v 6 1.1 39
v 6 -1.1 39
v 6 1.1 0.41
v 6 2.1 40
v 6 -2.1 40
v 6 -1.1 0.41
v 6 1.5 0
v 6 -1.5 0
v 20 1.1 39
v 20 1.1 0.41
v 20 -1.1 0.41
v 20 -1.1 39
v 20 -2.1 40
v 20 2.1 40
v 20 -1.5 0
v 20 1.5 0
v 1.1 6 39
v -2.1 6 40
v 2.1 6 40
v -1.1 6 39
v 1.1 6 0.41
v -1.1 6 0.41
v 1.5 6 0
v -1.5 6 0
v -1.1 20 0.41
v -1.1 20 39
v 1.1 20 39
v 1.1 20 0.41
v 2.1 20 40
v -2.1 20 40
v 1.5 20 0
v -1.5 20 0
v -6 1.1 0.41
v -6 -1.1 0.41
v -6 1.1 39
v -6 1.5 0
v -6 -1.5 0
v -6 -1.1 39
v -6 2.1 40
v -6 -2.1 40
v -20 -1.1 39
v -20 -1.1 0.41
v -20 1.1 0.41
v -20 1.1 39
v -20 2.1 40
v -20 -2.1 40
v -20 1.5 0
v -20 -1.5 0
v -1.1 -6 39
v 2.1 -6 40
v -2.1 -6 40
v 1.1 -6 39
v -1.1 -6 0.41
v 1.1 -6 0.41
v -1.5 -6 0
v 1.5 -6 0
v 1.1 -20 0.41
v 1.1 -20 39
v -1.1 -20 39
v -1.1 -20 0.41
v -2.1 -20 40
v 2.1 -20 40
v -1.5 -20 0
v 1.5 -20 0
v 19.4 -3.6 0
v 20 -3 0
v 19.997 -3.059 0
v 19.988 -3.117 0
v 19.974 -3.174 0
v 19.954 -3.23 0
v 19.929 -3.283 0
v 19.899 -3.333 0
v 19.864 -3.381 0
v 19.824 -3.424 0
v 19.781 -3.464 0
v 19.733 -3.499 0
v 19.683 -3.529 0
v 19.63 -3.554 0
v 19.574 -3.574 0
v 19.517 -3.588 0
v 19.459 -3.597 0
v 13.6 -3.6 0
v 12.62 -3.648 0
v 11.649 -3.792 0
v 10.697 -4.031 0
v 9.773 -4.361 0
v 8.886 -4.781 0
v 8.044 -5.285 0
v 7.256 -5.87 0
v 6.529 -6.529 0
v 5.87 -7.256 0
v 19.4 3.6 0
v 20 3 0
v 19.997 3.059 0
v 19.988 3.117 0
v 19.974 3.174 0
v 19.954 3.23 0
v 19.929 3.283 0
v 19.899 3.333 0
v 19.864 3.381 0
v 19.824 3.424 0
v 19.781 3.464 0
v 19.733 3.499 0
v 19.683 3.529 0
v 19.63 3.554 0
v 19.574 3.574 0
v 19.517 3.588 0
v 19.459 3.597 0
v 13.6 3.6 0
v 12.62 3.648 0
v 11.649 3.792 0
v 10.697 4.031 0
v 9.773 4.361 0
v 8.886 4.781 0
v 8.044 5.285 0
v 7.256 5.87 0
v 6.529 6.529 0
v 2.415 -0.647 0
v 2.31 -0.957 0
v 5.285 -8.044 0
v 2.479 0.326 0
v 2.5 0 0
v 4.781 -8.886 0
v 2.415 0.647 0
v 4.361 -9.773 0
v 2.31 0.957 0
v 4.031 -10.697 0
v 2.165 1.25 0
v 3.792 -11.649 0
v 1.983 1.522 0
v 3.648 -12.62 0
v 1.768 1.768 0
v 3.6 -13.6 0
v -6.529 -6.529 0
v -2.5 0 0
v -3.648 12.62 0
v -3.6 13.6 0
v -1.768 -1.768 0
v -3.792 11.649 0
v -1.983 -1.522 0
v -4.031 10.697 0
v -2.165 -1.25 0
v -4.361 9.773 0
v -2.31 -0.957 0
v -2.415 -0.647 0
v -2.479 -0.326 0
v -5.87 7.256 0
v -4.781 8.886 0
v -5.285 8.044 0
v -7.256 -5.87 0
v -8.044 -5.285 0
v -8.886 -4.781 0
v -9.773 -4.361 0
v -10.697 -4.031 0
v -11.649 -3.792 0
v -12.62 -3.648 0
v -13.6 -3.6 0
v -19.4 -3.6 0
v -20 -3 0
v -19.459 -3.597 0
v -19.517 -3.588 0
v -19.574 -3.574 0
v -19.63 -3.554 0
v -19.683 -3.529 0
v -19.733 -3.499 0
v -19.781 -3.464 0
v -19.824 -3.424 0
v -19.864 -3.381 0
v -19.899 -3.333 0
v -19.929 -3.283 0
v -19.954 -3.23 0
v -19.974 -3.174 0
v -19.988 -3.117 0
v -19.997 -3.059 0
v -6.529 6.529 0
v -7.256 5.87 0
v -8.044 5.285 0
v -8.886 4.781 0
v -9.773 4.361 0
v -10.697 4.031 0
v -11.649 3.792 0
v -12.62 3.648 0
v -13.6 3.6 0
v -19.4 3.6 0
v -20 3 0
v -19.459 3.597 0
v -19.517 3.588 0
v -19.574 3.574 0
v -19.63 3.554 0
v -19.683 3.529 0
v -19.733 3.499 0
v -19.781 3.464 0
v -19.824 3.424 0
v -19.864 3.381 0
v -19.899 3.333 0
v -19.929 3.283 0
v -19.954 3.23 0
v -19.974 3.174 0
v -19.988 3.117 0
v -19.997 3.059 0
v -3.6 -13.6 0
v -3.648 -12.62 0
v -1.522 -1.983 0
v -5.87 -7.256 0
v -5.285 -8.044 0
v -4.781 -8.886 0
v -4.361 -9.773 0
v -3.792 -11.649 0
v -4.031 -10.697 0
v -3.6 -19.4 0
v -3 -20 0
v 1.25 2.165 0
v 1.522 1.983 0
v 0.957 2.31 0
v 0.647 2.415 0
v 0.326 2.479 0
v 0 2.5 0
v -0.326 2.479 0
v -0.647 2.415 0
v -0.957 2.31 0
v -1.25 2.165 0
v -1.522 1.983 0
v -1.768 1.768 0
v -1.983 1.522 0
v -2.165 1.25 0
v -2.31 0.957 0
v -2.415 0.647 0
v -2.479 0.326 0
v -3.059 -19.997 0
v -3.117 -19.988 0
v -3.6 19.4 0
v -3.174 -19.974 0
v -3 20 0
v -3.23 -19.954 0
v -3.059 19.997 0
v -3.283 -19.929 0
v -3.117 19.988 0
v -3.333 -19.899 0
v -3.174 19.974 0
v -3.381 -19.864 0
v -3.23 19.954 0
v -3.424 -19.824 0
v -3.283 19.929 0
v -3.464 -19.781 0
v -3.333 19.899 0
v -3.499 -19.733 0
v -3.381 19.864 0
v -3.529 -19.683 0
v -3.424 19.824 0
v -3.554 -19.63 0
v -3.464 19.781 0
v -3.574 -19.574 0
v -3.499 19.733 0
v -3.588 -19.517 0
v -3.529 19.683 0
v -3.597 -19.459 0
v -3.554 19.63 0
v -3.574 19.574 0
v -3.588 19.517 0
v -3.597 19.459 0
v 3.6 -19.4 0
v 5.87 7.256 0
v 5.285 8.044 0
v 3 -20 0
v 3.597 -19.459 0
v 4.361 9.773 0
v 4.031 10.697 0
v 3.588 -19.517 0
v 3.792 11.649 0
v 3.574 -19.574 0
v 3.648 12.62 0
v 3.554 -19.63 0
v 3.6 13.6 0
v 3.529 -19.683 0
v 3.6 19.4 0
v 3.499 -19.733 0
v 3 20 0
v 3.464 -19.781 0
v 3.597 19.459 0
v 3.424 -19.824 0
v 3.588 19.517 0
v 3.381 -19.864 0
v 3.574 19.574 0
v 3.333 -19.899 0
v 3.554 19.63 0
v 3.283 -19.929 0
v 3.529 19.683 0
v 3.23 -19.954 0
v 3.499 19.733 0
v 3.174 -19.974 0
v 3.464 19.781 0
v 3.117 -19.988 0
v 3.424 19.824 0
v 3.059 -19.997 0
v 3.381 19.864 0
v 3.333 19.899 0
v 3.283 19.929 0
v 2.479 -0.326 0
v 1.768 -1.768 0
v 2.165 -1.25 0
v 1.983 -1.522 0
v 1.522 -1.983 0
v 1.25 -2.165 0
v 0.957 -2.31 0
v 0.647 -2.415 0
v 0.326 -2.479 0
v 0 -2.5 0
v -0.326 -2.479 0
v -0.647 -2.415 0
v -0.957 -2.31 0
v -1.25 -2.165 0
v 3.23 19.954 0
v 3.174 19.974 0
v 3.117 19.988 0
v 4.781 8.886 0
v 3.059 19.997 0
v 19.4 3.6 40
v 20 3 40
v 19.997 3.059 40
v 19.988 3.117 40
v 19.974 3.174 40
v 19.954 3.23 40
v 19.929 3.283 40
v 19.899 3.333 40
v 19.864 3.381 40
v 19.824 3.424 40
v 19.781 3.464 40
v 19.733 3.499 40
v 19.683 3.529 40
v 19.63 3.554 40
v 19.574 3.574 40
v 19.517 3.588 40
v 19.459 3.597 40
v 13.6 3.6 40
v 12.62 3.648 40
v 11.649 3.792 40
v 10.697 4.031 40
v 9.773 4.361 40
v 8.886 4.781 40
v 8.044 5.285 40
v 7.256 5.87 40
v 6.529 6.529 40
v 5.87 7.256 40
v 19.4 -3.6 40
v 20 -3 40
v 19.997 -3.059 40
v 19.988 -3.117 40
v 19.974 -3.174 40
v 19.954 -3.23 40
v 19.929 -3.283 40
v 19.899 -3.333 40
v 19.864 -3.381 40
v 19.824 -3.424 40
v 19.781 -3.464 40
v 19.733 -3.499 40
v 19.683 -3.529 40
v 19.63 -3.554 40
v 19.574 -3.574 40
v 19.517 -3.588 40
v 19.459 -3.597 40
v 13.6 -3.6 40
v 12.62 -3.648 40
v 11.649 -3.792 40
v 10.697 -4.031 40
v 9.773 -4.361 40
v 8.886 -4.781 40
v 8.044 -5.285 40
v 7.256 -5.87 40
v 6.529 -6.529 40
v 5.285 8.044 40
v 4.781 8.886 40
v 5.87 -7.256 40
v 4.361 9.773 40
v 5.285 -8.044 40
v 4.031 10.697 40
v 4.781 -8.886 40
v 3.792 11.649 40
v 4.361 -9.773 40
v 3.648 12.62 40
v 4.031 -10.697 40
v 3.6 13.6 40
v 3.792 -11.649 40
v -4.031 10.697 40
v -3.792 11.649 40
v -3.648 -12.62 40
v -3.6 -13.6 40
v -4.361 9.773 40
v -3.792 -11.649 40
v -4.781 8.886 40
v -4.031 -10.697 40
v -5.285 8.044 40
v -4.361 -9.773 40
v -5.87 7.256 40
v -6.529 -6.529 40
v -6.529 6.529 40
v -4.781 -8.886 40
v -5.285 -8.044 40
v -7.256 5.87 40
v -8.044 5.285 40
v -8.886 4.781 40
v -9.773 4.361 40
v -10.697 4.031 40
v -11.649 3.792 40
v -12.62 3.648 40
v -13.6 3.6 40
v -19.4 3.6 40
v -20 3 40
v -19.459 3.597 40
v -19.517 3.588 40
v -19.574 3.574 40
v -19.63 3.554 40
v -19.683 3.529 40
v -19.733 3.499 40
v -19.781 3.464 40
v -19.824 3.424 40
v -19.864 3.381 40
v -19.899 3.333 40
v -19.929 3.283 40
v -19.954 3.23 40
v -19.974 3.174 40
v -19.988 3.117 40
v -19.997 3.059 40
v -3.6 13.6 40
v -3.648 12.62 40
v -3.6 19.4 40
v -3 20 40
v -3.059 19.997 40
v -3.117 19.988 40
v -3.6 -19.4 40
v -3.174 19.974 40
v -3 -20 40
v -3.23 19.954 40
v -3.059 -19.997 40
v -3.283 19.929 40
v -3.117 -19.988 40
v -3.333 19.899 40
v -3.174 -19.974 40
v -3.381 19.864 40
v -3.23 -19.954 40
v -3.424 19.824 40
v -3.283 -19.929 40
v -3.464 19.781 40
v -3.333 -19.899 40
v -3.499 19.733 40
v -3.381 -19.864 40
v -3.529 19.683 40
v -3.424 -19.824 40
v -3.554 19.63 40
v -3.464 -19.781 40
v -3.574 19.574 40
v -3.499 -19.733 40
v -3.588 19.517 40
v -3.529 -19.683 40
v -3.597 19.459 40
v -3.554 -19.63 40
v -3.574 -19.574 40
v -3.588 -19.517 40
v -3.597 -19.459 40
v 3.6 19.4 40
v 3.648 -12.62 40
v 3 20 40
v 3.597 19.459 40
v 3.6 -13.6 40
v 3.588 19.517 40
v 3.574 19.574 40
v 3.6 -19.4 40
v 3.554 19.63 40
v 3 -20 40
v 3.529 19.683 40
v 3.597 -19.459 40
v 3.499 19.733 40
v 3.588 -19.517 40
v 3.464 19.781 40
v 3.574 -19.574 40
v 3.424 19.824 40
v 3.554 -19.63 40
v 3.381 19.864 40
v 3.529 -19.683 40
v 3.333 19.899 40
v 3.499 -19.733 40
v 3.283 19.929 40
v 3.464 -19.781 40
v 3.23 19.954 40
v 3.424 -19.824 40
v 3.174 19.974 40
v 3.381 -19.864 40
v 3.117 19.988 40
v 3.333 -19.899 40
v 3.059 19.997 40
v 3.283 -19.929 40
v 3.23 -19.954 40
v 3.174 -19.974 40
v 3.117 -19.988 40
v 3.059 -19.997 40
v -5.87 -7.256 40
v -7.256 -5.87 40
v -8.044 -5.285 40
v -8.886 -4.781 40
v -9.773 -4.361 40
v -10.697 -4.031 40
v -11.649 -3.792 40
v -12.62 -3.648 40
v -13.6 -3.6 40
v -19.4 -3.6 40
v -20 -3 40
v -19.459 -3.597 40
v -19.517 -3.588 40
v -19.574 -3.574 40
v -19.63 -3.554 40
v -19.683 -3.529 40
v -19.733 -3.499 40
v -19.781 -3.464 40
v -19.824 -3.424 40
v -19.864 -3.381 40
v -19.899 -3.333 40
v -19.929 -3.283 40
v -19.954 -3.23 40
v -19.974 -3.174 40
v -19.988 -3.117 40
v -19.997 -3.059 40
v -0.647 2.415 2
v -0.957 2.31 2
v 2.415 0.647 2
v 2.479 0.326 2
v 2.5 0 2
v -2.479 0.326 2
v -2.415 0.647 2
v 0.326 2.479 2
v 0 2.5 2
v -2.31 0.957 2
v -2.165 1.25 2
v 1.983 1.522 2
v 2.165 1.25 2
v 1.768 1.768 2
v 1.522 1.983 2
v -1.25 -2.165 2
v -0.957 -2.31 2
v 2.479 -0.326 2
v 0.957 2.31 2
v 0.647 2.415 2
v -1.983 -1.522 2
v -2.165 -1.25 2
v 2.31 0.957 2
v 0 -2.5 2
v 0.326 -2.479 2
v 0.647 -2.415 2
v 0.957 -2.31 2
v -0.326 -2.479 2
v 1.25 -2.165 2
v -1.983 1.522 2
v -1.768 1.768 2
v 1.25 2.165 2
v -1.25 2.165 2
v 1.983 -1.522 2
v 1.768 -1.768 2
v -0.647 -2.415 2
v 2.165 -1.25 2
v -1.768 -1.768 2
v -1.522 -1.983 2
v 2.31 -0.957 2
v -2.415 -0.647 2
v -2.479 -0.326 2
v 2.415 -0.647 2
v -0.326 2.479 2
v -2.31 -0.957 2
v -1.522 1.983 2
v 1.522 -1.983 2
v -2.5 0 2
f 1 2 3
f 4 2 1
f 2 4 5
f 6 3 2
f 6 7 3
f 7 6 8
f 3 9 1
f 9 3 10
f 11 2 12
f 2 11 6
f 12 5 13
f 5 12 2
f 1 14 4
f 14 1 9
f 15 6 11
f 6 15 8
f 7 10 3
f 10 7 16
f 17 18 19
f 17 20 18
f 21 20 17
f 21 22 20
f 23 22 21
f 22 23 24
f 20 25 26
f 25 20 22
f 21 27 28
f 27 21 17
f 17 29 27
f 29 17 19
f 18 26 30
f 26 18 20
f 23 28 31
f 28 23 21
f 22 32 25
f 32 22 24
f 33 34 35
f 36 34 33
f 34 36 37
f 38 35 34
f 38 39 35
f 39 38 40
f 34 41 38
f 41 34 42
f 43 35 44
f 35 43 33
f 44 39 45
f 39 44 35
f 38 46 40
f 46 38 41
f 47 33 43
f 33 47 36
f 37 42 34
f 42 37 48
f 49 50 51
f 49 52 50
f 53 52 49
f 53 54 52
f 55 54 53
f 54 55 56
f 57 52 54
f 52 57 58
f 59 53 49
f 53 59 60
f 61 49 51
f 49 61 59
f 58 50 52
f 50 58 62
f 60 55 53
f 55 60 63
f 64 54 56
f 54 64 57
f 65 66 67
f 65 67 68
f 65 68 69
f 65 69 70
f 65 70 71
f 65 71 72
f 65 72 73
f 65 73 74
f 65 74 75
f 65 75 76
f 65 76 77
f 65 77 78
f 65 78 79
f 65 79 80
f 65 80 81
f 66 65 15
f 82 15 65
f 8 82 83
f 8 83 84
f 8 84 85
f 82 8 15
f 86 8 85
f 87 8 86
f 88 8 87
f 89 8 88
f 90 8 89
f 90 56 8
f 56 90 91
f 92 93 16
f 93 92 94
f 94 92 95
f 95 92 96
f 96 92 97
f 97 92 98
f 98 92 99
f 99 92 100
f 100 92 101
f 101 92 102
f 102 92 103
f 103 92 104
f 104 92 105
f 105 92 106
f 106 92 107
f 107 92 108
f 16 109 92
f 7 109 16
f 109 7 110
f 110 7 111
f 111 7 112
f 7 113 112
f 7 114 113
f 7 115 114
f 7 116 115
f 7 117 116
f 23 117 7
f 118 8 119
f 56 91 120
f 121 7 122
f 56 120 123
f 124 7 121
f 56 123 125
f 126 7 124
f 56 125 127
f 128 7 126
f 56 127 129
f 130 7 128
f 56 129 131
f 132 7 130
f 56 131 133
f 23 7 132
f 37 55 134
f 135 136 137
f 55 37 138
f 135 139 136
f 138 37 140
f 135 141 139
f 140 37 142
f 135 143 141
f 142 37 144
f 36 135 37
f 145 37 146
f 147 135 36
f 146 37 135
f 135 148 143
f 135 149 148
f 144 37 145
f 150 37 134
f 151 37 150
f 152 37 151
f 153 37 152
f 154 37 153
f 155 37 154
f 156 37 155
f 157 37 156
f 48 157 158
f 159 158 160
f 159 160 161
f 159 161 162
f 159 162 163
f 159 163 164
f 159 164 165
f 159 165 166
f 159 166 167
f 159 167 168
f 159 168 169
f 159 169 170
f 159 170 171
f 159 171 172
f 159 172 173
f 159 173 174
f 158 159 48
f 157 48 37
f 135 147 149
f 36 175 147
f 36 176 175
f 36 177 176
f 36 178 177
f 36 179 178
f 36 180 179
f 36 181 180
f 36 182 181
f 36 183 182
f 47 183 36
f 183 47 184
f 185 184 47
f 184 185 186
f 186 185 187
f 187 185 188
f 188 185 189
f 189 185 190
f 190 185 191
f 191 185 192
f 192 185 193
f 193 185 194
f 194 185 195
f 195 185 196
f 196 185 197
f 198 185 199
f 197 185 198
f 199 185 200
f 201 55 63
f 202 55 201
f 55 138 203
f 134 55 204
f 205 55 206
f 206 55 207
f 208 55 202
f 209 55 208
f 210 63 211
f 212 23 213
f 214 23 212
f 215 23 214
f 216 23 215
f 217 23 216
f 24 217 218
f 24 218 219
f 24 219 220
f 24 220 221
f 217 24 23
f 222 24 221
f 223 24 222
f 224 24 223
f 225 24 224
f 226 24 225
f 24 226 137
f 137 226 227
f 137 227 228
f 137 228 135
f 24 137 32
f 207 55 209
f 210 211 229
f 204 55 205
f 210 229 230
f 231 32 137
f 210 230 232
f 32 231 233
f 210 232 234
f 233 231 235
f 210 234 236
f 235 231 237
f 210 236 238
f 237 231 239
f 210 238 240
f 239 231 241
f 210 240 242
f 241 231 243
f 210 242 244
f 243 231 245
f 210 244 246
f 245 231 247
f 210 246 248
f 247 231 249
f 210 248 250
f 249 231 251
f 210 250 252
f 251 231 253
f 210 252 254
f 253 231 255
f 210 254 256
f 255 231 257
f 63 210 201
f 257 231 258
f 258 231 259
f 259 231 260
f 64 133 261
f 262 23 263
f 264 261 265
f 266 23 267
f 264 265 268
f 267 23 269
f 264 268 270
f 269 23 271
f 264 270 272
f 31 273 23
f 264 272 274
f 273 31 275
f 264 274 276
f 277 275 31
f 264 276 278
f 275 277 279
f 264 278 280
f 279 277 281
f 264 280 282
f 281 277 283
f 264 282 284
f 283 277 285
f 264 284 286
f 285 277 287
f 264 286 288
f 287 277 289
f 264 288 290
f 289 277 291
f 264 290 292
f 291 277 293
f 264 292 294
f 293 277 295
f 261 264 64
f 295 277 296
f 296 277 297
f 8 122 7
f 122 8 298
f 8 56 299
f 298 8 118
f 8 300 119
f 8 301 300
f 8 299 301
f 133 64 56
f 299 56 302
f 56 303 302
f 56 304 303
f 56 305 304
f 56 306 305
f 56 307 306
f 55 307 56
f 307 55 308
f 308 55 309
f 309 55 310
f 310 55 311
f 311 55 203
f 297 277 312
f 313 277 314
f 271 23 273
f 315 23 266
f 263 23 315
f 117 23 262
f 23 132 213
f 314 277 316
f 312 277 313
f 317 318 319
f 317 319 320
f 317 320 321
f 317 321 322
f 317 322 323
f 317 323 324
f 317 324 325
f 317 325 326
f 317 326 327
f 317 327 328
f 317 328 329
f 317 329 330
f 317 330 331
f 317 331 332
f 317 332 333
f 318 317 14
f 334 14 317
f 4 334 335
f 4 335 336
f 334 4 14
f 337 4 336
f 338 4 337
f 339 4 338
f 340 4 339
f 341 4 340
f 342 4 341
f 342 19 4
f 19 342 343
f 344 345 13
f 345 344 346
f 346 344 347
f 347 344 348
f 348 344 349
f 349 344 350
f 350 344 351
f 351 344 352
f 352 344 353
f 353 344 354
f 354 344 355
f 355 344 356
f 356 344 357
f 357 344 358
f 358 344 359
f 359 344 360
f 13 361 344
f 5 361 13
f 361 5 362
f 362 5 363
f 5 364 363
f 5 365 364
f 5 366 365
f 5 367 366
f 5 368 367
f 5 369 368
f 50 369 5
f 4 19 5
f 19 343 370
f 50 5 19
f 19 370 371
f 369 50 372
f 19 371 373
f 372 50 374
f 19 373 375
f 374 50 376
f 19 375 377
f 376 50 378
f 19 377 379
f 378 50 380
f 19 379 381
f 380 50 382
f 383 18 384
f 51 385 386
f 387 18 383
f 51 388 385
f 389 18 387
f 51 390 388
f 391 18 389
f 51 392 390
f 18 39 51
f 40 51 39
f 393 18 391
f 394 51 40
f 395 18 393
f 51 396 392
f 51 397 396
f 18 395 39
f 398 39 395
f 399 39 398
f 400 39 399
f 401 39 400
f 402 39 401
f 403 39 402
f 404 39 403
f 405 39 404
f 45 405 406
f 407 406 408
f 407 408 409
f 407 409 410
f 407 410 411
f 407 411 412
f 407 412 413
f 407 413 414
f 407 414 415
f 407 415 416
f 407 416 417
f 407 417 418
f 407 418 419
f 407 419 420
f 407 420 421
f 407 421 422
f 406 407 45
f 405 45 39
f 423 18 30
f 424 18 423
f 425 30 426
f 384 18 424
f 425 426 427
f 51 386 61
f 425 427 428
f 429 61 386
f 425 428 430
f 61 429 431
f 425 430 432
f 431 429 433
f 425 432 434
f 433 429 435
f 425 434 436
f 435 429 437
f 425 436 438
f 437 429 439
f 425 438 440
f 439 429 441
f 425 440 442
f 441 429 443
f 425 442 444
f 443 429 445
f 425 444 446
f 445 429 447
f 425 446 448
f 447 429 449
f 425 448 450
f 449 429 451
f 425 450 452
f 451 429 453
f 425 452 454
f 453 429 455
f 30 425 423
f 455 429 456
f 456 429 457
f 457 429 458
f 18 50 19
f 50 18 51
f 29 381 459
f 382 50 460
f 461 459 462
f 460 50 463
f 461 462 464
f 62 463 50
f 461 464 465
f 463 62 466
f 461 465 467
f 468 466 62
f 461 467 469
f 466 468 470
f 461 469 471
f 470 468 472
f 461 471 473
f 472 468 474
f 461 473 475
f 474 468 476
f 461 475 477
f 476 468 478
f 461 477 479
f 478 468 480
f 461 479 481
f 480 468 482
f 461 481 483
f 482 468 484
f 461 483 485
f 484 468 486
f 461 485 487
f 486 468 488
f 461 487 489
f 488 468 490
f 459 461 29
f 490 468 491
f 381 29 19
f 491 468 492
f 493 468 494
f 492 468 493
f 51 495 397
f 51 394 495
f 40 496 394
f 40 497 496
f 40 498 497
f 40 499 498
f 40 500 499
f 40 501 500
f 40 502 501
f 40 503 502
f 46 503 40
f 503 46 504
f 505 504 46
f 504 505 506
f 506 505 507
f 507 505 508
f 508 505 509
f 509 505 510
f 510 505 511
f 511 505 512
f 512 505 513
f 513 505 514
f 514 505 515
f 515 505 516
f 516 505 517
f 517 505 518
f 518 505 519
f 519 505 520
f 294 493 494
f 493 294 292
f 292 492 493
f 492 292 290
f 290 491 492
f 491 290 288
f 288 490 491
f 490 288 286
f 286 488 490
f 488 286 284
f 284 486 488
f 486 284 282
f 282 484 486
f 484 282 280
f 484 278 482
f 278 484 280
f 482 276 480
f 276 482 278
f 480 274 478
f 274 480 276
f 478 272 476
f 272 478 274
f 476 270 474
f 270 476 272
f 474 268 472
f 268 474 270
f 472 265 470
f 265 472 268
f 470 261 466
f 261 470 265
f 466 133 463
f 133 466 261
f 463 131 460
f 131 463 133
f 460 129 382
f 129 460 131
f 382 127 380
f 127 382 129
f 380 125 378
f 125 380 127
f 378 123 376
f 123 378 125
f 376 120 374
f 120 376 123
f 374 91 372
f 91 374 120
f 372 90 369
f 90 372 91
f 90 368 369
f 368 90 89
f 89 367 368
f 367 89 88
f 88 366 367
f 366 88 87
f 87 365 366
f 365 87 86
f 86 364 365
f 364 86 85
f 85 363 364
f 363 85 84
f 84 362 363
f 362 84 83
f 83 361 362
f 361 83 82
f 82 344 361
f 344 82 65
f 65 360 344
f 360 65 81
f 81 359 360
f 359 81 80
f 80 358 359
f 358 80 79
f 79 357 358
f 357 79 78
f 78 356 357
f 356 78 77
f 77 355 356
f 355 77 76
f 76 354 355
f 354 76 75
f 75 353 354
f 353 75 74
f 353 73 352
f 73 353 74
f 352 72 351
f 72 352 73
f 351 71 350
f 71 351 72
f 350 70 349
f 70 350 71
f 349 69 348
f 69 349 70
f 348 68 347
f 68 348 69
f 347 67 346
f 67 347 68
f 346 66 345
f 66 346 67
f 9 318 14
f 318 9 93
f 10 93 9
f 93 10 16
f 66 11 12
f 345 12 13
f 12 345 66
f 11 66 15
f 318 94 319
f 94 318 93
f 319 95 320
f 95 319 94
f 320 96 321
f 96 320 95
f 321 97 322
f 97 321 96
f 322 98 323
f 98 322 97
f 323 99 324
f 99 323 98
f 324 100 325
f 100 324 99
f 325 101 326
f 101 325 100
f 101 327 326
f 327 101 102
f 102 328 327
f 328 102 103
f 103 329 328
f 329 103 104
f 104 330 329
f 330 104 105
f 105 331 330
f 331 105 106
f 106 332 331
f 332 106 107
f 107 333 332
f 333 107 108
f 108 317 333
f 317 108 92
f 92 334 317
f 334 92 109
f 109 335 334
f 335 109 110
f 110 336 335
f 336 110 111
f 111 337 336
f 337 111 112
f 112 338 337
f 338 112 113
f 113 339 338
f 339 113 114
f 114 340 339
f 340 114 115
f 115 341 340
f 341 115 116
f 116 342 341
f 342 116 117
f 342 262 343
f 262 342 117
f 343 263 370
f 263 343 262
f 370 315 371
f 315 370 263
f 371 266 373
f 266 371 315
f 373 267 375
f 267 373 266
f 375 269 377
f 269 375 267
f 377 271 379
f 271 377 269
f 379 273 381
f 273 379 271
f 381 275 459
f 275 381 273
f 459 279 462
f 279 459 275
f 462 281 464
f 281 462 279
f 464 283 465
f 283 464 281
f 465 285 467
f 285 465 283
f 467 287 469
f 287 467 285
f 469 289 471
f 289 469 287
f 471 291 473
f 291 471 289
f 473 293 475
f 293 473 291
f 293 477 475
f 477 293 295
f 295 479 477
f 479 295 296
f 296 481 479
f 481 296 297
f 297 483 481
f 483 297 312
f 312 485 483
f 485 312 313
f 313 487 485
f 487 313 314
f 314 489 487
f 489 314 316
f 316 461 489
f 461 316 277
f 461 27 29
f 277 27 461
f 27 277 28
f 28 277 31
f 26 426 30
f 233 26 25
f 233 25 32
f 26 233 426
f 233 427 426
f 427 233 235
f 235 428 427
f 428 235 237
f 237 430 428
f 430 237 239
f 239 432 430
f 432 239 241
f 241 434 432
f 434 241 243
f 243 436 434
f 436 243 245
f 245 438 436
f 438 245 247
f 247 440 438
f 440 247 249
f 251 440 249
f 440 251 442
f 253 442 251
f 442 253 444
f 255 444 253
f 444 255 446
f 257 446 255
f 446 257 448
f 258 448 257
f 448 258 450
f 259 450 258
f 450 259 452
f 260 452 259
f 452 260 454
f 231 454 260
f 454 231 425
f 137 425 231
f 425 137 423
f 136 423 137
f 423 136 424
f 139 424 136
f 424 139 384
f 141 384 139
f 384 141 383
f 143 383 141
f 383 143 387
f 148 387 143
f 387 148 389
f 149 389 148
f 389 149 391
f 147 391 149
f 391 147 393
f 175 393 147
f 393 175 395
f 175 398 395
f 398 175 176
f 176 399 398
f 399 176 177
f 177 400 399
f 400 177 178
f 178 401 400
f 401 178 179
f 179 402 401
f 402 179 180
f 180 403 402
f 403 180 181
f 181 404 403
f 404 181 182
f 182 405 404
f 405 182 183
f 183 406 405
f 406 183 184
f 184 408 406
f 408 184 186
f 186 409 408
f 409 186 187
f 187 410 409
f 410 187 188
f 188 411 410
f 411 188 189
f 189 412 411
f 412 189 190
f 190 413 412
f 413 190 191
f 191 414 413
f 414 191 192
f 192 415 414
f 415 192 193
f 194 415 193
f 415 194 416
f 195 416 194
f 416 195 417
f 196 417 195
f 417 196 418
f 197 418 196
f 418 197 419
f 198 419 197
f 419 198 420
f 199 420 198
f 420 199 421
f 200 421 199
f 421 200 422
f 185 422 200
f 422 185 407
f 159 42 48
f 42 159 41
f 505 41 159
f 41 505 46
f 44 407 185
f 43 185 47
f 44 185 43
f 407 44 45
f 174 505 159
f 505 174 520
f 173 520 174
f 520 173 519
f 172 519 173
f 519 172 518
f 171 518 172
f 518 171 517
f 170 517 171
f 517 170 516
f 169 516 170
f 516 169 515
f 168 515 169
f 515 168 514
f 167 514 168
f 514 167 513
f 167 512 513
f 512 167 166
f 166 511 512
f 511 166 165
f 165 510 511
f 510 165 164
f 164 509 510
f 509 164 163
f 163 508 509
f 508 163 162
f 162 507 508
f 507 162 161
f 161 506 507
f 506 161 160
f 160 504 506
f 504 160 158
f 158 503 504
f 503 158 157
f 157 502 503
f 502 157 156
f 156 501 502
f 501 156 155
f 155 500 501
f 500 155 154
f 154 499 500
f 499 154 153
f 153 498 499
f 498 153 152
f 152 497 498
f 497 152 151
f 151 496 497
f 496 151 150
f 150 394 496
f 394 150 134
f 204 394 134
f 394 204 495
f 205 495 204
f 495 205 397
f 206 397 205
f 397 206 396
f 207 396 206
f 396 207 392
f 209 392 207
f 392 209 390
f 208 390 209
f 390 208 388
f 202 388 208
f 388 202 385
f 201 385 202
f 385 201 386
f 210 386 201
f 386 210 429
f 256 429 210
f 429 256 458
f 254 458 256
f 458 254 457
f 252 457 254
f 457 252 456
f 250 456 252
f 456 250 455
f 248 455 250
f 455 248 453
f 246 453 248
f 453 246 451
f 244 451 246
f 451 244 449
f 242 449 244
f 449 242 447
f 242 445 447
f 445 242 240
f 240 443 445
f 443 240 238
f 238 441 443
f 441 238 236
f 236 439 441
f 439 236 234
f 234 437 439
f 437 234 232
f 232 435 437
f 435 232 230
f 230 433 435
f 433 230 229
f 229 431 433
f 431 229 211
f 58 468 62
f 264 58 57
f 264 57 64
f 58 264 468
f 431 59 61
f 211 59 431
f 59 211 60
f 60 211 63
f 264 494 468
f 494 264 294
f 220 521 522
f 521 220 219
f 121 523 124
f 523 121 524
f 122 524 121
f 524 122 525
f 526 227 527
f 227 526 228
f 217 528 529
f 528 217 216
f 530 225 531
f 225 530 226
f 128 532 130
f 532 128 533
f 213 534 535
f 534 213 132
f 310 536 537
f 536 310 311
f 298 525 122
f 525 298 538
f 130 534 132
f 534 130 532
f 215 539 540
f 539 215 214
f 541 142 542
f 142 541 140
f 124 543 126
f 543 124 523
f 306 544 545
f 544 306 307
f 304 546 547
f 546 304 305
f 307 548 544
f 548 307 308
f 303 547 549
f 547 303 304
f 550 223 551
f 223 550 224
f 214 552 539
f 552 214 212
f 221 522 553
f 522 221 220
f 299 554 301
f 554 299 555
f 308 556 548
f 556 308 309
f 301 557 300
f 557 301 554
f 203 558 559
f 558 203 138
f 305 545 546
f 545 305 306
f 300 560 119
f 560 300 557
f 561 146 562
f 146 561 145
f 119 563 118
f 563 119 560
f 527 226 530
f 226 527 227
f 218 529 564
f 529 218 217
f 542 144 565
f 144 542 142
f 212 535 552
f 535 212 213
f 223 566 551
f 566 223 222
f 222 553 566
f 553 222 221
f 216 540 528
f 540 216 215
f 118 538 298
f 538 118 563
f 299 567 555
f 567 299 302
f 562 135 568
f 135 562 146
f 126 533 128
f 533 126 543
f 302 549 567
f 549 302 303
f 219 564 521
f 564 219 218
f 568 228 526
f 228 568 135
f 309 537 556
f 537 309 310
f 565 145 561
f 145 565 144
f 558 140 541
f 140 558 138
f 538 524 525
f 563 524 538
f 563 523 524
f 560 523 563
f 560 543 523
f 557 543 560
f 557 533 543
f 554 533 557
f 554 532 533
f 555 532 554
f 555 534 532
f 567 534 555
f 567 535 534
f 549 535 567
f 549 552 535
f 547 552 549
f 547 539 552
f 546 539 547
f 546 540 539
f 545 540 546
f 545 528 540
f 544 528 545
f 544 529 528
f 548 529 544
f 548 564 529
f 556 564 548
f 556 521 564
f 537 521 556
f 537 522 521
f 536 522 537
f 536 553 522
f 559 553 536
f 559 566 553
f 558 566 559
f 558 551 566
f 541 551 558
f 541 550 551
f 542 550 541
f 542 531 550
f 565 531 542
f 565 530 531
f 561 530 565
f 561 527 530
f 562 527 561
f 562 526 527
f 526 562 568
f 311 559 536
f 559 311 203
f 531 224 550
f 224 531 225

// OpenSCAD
// The Drawer Dividers V3 – Connector
// Cross, T, corner, straight joiner, end piece and slip-on variants.

/* [Part] */
// Connector type
Type = "cross"; // [cross:Cross (+), tee:T-piece, corner:Corner (L), straight:Straight joiner, end:End piece, slip_cross:Slip-on cross, slip_tee:Slip-on T, slip_corner_r:Slip-on corner right, slip_corner_l:Slip-on corner left]
// How many copies on the plate
Count = 1; // [1:1:40]
// Gap between copies (mm)
Spacing = 4; // [1:1:20]

/* [System] */
// Start from a preset or use the values below
Preset = "custom"; // [custom:Custom (values below), v2:V2 defaults, v1:V1 Classic (4.9 mm walls with cap)]
// Exact thickness of your printed walls (mm)
Wall_Thickness = 2.0; // [0.8:0.1:10]
// Extra slot width so the wall does not bind (mm, 0.2 fits most printers)
Tolerance = 0.2; // [0:0.01:1]
// Height of the connectors (mm)
Height = 40; // [10:1:150]

/* [Fit & Shape] */
// How deep the wall slides into an arm (mm)
Insert_Depth = 14; // [5:1:30]
// Material left and right of the slot (mm)
Shell_Thickness = 2.5; // [1:0.1:5]
// Arm length measured from the centre (mm)
Arm_Length = 20; // [10:1:100]
// Inner fillet between two arms (mm)
Inner_Fillet = 10; // [0:0.5:20]
// Rounding of the outer edges (mm)
Edge_Radius = 0.6; // [0:0.1:2]
// Closed cap on one end like V1 (mm, 0 = open on both ends)
Cap_Thickness = 0; // [0:0.5:10]
// Cap thickness of the slip-on connectors (mm)
Floor_Thickness = 2; // [0.5:0.1:5]
// Chamfer at the slot opening for easy insertion (mm)
Lead_In = 1; // [0:0.1:5]
// Gap between wall end and pocket bottom (mm)
End_Gap = 0.3; // [0:0.1:2]
// Gap between wall top and cap (mm)
Top_Gap = 0.2; // [0:0.05:1]

/* [Print Optimisation] */
// Widens the slots on the first layers against elephant foot (mm, 0 = off)
Elephant_Foot_Compensation = 0.4; // [0:0.1:2]
// Pocket for a magnet or rubber foot underneath (mm, 0 = off)
Magnet_Diameter = 5; // [0:0.1:10]
// Depth of that pocket (mm)
Magnet_Depth = 2; // [0.1:0.1:10]

/* [Hidden] */
$fn = 64;

P = Preset != "custom" ? dd_preset(Preset) : dd_profile(
    wall_t = Wall_Thickness, tol = Tolerance, height = Height,
    insert = Insert_Depth, shell = Shell_Thickness, arm = Arm_Length,
    fillet = Inner_Fillet, edge_r = Edge_Radius, cap = Cap_Thickness,
    floor_t = Floor_Thickness, lead_in = Lead_In, efc = Elephant_Foot_Compensation,
    magnet_d = Magnet_Diameter, magnet_h = Magnet_Depth,
    end_gap = End_Gap, top_gap = Top_Gap);

pitch = dd_connector_size(P) + Spacing;
dd_grid(Count, pitch, pitch) dd_connector(Type, P);

// ============================================================================
//  Library (scad/lib/drawer_divider.scad, inlined by tools/build.py)
// ============================================================================
// =============================================================================
//  The Drawer Dividers – core library (V3, unifies V1 + V2)
//  Usage:  use <lib/drawer_divider.scad>
//  All dimensions in mm. This file creates no geometry on its own.
// =============================================================================

DD_VERSION = "3.0.0";
DD_EPS = 0.01;

// =============================================================================
//  System profile
// =============================================================================
// Every part of one drawer is built from the same profile, so walls,
// connectors and rails always fit each other. A profile is a key/value list;
// read single values with dd(p, "key").

function dd_profile(
    wall_t   = 2.0,  // thickness of the printed walls
    tol      = 0.2,  // extra slot width so the wall does not bind
    height   = 40,   // connector height
    insert   = 14,   // how deep a wall slides into a connector arm
    shell    = 2.5,  // connector material left and right of the slot
    arm      = 20,   // arm length, measured from the connector centre
    fillet   = 10,   // inner fillet radius between two arms
    edge_r   = 0.6,  // rounding of the outer vertical edges
    cap      = 0,    // closed cap (V1 style); 0 = slots open on both ends
    floor_t  = 2,    // cap thickness of slip-on connectors
    lead_in  = 1,    // chamfer at the open slot end
    efc      = 0.4,  // elephant foot compensation at the bed side
    magnet_d = 5,    // magnet / rubber foot pocket, 0 = off
    magnet_h = 2,
    end_gap  = 0.3,  // gap between wall end and pocket bottom
    top_gap  = 0.2   // gap between wall top and cap (capped connectors only)
) = [
    ["wall_t", wall_t], ["tol", tol], ["height", height], ["insert", insert],
    ["shell", shell], ["arm", arm], ["fillet", fillet], ["edge_r", edge_r],
    ["cap", cap], ["floor_t", floor_t], ["lead_in", lead_in], ["efc", efc],
    ["magnet_d", magnet_d], ["magnet_h", magnet_h], ["end_gap", end_gap],
    ["top_gap", top_gap]
];

function dd(p, key) =
    let(i = search([key], p)[0])
    assert(is_num(i), str("dd(): unknown profile key '", key, "'"))
    p[i][1];

// "v2": 2 mm walls, open connectors (V2 defaults)
// "v1": 4.9 mm walls, 50 mm high, 5 mm cap – matches the original V1 STLs
function dd_preset(name) =
    name == "v1" ? dd_profile(wall_t = 4.9, tol = 0.1, height = 50, cap = 5,
                              lead_in = 0.6, efc = 0, magnet_d = 0,
                              edge_r = 0.5, top_gap = 0.1)
                 : dd_profile();

// ---- derived values (the designer uses the same formulas) -------------------
function dd_slot_w(p)       = dd(p, "wall_t") + dd(p, "tol");
function dd_arm_w(p)        = dd_slot_w(p) + 2 * dd(p, "shell");
function dd_pocket_start(p) = dd(p, "arm") - dd(p, "insert");
// distance from a connector centre to the end of a fully inserted wall
function dd_wall_inset(p)   = dd_pocket_start(p) + dd(p, "end_gap");
function dd_cap(p, slip = false) =
    slip ? max(dd(p, "cap"), dd(p, "floor_t")) : dd(p, "cap");
function dd_wall_height(p, slip = false) =
    let(c = dd_cap(p, slip))
    dd(p, "height") - (c > 0 ? c + dd(p, "top_gap") : 0);
// wall length for two connector centres `center_dist` apart
function dd_wall_length(center_dist, p, ends = 2) =
    center_dist - ends * dd_wall_inset(p);

// =============================================================================
//  Connectors
// =============================================================================
// Directions: 0 = +X, 1 = +Y, 2 = -X, 3 = -Y.
// Definition: [arms, slots, through_y, slip_on]
//   through_y: one continuous slot along Y (the wall passes straight through)
//   slip_on:   printed cap-down, then flipped and pushed onto the walls

DD_CONNECTOR_TYPES = ["cross", "tee", "corner", "straight", "end",
                      "slip_cross", "slip_tee", "slip_corner_r", "slip_corner_l"];

function dd_connector_def(type) =
    type == "cross"         ? [[1,1,1,1], [1,1,1,1], false, false] :
    type == "tee"           ? [[1,1,1,0], [1,1,1,0], false, false] :
    type == "corner"        ? [[1,1,0,0], [1,1,0,0], false, false] :
    type == "straight"      ? [[1,0,1,0], [1,0,1,0], false, false] :
    type == "end"           ? [[1,0,0,0], [1,0,0,0], false, false] :
    type == "slip_cross"    ? [[1,1,1,1], [1,1,1,1], true,  true ] :
    type == "slip_tee"      ? [[1,1,0,1], [1,1,0,1], true,  true ] :
    type == "slip_corner_r" ? [[1,1,0,0], [1,1,0,1], true,  true ] :
    type == "slip_corner_l" ? [[0,1,1,0], [0,1,1,1], true,  true ] :
    undef;

module dd_connector(type = "cross", p = dd_profile()) {
    def = dd_connector_def(type);
    assert(!is_undef(def), str("dd_connector(): unknown type '", type, "'"));
    dd_connector_custom(arms = def[0], slots = def[1], through_y = def[2],
                        cap = dd_cap(p, def[3]), p = p);
}

// Build any connector from an arm/slot pattern.
module dd_connector_custom(arms = [1,1,1,1], slots = undef, through_y = false,
                           cap = 0, p = dd_profile()) {
    sl  = is_undef(slots) ? arms : slots;
    h   = dd(p, "height");
    aw  = dd_arm_w(p);
    arm = dd(p, "arm");
    ps  = dd_pocket_start(p);
    md  = dd(p, "magnet_d");
    z0  = cap > 0 ? cap : -1;   // slots start above the cap

    difference() {
        linear_extrude(h) dd_connector_outline(arms, p);

        for (i = [0:3]) if (sl[i] && !(through_y && i == 3))
            rotate(90 * i)
                dd_slot_cut(x0 = (through_y && i == 1) ? -(arm + 1) : ps,
                            x1 = arm + 1, z0 = z0, p = p);

        // magnet pocket on the side that faces the drawer floor in use
        if (!through_y && md > 0 && md <= min(aw, 2 * ps) - 1) {
            mh = dd(p, "magnet_h");
            if (cap > 0) translate([0, 0, h - mh]) cylinder(d = md, h = mh + 1, $fn = 48);
            else translate([0, 0, -DD_EPS]) cylinder(d = md, h = mh + DD_EPS, $fn = 48);
        }
    }
}

module dd_connector_outline(arms, p) {
    aw = dd_arm_w(p);
    dd_round_convex(dd(p, "edge_r"))
    dd_round_concave(dd(p, "fillet"))
    union() {
        square(aw, center = true);
        for (i = [0:3]) if (arms[i])
            rotate(90 * i) translate([0, -aw / 2]) square([dd(p, "arm"), aw]);
    }
}

// one slot along +X from x0 to x1, open at the top
module dd_slot_cut(x0, x1, z0, p) {
    h    = dd(p, "height");
    sw   = dd_slot_w(p);
    li   = dd(p, "lead_in");
    efc  = dd(p, "efc");
    len  = x1 - x0;

    translate([x0, -sw / 2, z0]) cube([len, sw, h - z0 + 1]);

    if (li > 0) hull() {
        translate([x0, -sw / 2, h - li]) cube([len, sw, DD_EPS]);
        translate([x0, -sw / 2 - li, h]) cube([len, sw + 2 * li, 1]);
    }
    // only where the slot touches the print bed
    if (z0 < 0 && efc > 0) hull() {
        translate([x0, -sw / 2 - efc, -1]) cube([len, sw + 2 * efc, 1]);
        translate([x0, -sw / 2, efc]) cube([len, sw, DD_EPS]);
    }
}

// footprint size, used to space copies on the plate
function dd_connector_size(p) = 2 * dd(p, "arm");

// =============================================================================
//  Walls
// =============================================================================
// Built standing: X = length, Y = thickness (centred), Z = height.

module dd_wall(length, p = dd_profile(), height = undef, pattern = "none",
               cell = 8, web = 2, margin_side = -1, margin_tb = 5,
               end_chamfer = 0.5, grip = 0) {
    h  = is_undef(height) ? dd_wall_height(p) : height;
    t  = dd(p, "wall_t");
    // keep the pattern out of the connector pockets
    ms = margin_side < 0 ? dd(p, "insert") + 2 : margin_side;

    difference() {
        linear_extrude(h) dd_wall_2d(length, t, end_chamfer);
        dd_wall_pattern(length, t, h, pattern, cell, web, ms,
                        margin_tb, margin_tb + grip);
        if (grip > 0)
            translate([0, 0, h]) rotate([90, 0, 0])
                cylinder(r = grip, h = t + 2, center = true, $fn = 48);
    }
}

module dd_wall_2d(l, t, c) {
    ce = min(c, t / 2 - 0.01);
    if (ce > 0)
        polygon([
            [-l/2 + ce, -t/2], [ l/2 - ce, -t/2], [ l/2, -t/2 + ce], [ l/2,  t/2 - ce],
            [ l/2 - ce,  t/2], [-l/2 + ce,  t/2], [-l/2,  t/2 - ce], [-l/2, -t/2 + ce]
        ]);
    else
        square([l, t], center = true);
}

// Hex or circle pattern with a constant web between the holes.
module dd_wall_pattern(l, t, h, pattern, cell, web, ms, mb, mt) {
    if (pattern == "hex" || pattern == "circle") {
        hex   = pattern == "hex";
        D     = hex ? cell * sqrt(3) + web : 2 * cell + web;  // vertical pitch
        ext_x = cell;
        ext_z = hex ? cell * sqrt(3) / 2 : cell;
        max_w = l - 2 * ms - 2 * ext_x;
        max_h = h - mb - mt - 2 * ext_z;
        stagger = max_h >= D / 2;
        sx    = stagger ? D * sqrt(3) / 2 : 2 * cell + web;
        cols  = max_w >= 0 ? floor(max_w / sx) + 1 : 0;
        st    = stagger && cols > 1;
        rows  = max_h >= 0 ? floor((max_h - (st ? D / 2 : 0)) / D) + 1 : 0;

        if (cols > 0 && rows > 0) {
            pw = (cols - 1) * sx;
            ph = (rows - 1) * D + (st ? D / 2 : 0);
            z0 = mb + ext_z + (max_h - ph) / 2;
            for (c = [0 : cols - 1], r = [0 : rows - 1])
                translate([-pw / 2 + c * sx, 0, z0 + r * D + (st && c % 2 == 1 ? D / 2 : 0)])
                    rotate([90, 0, 0])
                        cylinder(r = cell, h = t + 2, center = true, $fn = hex ? 6 : 32);
        }
    }
}

// =============================================================================
//  Rails ("Raster Wall") – glued or screwed to the drawer side
// =============================================================================
// Built flat: X = length, Y = width (= height in the drawer), Z = thickness.
// Teeth form slots of the system slot width. teeth_offset = position of the
// first tooth from x = 0; -1 centres the pattern. Joined rails use explicit
// offsets so the slot pitch continues across the joint.

function dd_rail_pitch(p, tooth_t = 2) = tooth_t + dd_slot_w(p);

function dd_rail_center_offset(length, p, tooth_t = 2) =
    let(sw = dd_slot_w(p), pitch = tooth_t + sw,
        n = max(1, floor((length + sw) / pitch)),
        used = n * tooth_t + (n - 1) * sw)
    (length - used) / 2;

module dd_rail(length, width, p = dd_profile(), plate = 2.5, tooth_t = 2,
               tooth_h = 6, tooth_chamfer = 0.6, tooth_fillet = 0.5,
               teeth_offset = -1, teeth = true, tongue = true, socket = true,
               tongue_len = 2, tongue_w = -1, tongue_chamfer = 1,
               tol_w = 1, tol_d = 0.5, tol_z = 0.1,
               screws = 3, screw_d = 3.2, head_d = 6.5) {
    sw    = dd_slot_w(p);
    pitch = tooth_t + sw;
    x0    = teeth_offset >= 0 ? teeth_offset : dd_rail_center_offset(length, p, tooth_t);
    n     = floor((length - x0 - tooth_t) / pitch) + 1;
    tw    = tongue_w < 0 ? max(width - 12, width * 0.6) : min(tongue_w, width - 4);
    zt    = plate / 2 - tol_z / 2;
    zs    = plate / 2 + tol_z / 2;

    difference() {
        union() {
            cube([length, width, plate]);
            if (tongue)
                translate([length, (width - tw) / 2, 0]) linear_extrude(zt)
                    polygon([[0, 0], [tongue_len, tongue_chamfer],
                             [tongue_len, tw - tongue_chamfer], [0, tw]]);
            if (teeth && n > 0)
                for (i = [0 : n - 1])
                    translate([x0 + i * pitch, 0, plate - DD_EPS])
                        dd_rail_tooth(width, tooth_t, tooth_h, tooth_chamfer, tooth_fillet);
        }
        if (socket) {
            bw = tw + 2 * tol_w;
            translate([-DD_EPS, (width - bw) / 2, -DD_EPS])
                cube([tongue_len + tol_d + DD_EPS, bw, zs + DD_EPS]);
        }
        // screws sit in the middle of a slot so they damage as few teeth as possible
        if (screws > 0) for (s = [1 : screws]) {
            k  = round((length * s / (screws + 1) - x0 - tooth_t - sw / 2) / pitch);
            xs = x0 + tooth_t + sw / 2 + k * pitch;
            cs = min(1.5, plate - 0.4);
            translate([xs, width / 2, 0]) {
                translate([0, 0, -1]) cylinder(d = screw_d, h = plate + 2, $fn = 32);
                translate([0, 0, plate - cs]) cylinder(d1 = screw_d, d2 = head_d, h = cs + DD_EPS, $fn = 32);
                translate([0, 0, plate]) cylinder(d = head_d + 0.5, h = tooth_h + 1, $fn = 32);
            }
        }
    }
}

// One tooth across the full rail width, with lead-in chamfer and base fillets.
// Keep tooth_fillet <= the wall end chamfer so walls still reach the plate.
module dd_rail_tooth(width, tt, th, ch, fr) {
    c = max(0, min(ch, tt / 2 - 0.2, th - 0.5));
    translate([0, width, 0]) rotate([90, 0, 0]) linear_extrude(width) {
        polygon([[0, 0], [tt, 0], [tt, th - c], [tt - c, th], [c, th], [0, th - c]]);
        if (fr > 0) {
            translate([tt, 0]) dd_fillet_2d(fr);
            mirror([1, 0]) dd_fillet_2d(fr);
        }
    }
}

// =============================================================================
//  Tolerance test
// =============================================================================
// A bar with one slot per tolerance (value engraved next to it) plus a short
// test wall. Print both, find the slot that fits best, use that tolerance.

module dd_tolerance_test(p = dd_profile(), tols = [0.1, 0.15, 0.2, 0.25, 0.3],
                         height = 12, depth = 20, land = 8, base = 1.2,
                         coupon = true) {
    t = dd(p, "wall_t");
    n = len(tols);
    function x_at(i) = land * (i + 1) + i * t + dd_sum(tols, i);
    L = x_at(n);

    difference() {
        cube([L, depth, height]);
        for (i = [0 : n - 1]) {
            translate([x_at(i), -1, base]) cube([t + tols[i], depth + 2, height]);
            translate([x_at(i) - land / 2, depth / 2, height - 0.6])
                linear_extrude(1) rotate(90)
                    text(str(tols[i]), size = min(3.2, land * 0.42),
                         halign = "center", valign = "center");
        }
    }
    if (coupon)
        translate([L / 2, depth + 8, 0])
            dd_wall(30, p, height = height + 4, end_chamfer = 0.3);
}

// =============================================================================
//  Helpers
// =============================================================================

function dd_sum(v, n) = n <= 0 ? 0 : v[n - 1] + dd_sum(v, n - 1);

module dd_round_concave(r) { if (r > 0) offset(r = -r) offset(r = r) children(); else children(); }
module dd_round_convex(r)  { if (r > 0) offset(r = r) offset(delta = -r) children(); else children(); }

module dd_fillet_2d(r) {
    difference() {
        square([r, r]);
        translate([r, r]) circle(r = r, $fn = 24);
    }
}

// Arrange `count` copies of the child in rows that fit max_w, centred on the origin.
module dd_grid(count, pitch_x, pitch_y, max_w = 240) {
    cols = max(1, min(count, floor((max_w + DD_EPS) / pitch_x)));
    rows = ceil(count / cols);
    for (i = [0 : count - 1])
        translate([((i % cols) - (cols - 1) / 2) * pitch_x,
                   (floor(i / cols) - (rows - 1) / 2) * pitch_y, 0])
            children();
}

// Lay a standing wall flat on the bed.
module dd_lay_flat(t) { translate([0, 0, t / 2]) rotate([90, 0, 0]) children(); }
